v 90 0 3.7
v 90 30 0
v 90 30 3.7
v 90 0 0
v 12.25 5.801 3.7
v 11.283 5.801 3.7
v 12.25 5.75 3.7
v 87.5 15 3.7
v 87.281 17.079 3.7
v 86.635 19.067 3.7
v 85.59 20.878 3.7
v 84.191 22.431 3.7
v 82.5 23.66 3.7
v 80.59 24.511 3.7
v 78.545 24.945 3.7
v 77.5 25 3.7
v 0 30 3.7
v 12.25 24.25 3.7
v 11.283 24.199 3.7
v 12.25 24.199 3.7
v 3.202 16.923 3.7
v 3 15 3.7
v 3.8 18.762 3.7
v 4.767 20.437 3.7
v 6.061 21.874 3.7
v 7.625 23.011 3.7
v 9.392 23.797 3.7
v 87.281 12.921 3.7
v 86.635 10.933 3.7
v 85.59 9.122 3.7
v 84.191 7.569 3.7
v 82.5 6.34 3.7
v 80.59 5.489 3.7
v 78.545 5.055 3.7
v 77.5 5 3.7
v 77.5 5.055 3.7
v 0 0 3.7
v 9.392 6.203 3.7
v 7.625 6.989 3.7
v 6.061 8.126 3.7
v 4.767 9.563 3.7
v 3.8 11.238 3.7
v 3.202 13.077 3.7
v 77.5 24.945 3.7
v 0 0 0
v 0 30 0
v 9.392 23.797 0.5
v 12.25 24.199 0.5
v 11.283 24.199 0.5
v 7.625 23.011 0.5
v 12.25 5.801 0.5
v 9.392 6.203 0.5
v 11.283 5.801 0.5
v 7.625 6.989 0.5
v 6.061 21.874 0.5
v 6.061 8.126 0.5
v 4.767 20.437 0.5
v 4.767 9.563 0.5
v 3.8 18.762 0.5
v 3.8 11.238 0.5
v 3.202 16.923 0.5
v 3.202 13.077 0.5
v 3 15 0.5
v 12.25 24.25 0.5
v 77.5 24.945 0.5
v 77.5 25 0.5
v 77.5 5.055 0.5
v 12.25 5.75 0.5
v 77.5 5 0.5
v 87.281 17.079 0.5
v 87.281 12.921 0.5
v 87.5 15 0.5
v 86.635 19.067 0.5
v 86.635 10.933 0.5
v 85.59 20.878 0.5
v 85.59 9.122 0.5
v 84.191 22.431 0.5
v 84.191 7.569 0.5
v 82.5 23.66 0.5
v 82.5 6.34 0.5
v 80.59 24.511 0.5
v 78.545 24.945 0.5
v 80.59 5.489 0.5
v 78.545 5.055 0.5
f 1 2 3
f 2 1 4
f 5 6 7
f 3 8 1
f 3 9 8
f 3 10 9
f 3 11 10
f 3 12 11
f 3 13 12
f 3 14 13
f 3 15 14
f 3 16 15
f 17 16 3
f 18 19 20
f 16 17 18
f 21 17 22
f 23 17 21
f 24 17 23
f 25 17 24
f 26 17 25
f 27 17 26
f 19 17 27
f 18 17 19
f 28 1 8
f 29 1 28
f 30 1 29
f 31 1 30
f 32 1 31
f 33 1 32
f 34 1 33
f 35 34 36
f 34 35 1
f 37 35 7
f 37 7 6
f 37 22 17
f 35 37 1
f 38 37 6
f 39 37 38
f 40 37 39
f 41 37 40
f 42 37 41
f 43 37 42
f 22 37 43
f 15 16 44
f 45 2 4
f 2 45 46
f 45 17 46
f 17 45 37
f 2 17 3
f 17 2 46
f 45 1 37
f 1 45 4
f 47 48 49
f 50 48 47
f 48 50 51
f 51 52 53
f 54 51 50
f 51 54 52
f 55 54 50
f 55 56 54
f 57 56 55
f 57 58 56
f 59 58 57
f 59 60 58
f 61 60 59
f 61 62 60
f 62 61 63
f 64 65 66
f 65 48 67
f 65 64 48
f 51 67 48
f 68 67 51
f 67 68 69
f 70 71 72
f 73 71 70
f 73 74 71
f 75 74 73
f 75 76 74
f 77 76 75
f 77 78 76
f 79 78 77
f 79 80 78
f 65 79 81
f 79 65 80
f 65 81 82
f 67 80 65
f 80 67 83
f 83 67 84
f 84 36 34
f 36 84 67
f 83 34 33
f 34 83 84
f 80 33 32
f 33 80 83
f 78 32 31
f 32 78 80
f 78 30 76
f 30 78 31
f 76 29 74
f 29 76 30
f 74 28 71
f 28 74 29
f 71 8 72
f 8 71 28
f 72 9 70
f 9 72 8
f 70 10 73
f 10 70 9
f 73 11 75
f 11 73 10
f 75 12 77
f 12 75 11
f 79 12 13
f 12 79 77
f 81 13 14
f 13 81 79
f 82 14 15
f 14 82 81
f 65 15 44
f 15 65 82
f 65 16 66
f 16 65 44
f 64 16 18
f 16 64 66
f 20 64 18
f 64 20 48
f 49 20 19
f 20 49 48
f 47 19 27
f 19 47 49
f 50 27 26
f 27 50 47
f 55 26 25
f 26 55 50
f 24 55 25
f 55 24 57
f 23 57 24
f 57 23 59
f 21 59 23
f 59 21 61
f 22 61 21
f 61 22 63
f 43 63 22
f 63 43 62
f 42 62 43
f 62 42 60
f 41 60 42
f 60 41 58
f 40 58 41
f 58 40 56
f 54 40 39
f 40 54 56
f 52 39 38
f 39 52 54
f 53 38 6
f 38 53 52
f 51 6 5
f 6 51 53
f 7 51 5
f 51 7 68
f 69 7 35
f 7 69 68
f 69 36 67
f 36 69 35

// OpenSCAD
module knife_shape() {
    left_radius = 0.925 * 10; // Left circle radius
    right_radius = 1.0 * 10;  // Right circle radius
    length = 84.5; // Total length in mm
    
    left_center = [left_radius, 0];
    right_center = [length - right_radius, 0];

    // Draw the knife shape
    union() {
        // Left circle
        translate([left_radius, 0]) {
            circle(left_radius);
        }
        // Right circle
        translate([length - right_radius, 0]) {
            circle(right_radius);
        }

        // Tangent lines
        polygon([
            [left_radius, left_radius],          // Top tangent, left
            [length - right_radius, right_radius], // Top tangent, right
            [length - right_radius, -right_radius], // Bottom tangent, right
            [left_radius, -left_radius]          // Bottom tangent, left
        ]);
    }
}

module mold() {
    mold_width = 90;  // Width of the mold block
    mold_length = 30; // Length of the mold block
    mold_height = 3.7;  // Height of the mold block
    mold_depth = 3.2;    // Depth of the knife cavity

    difference() {
        // Mold block
        cube([mold_width, mold_length, mold_height]);

        // Knife cavity
        translate([(mold_width - 84) / 2, (mold_length) / 2, mold_height - mold_depth]) {
            linear_extrude(height = mold_depth) {
                knife_shape();
            }
        }
    }
}

mold();
